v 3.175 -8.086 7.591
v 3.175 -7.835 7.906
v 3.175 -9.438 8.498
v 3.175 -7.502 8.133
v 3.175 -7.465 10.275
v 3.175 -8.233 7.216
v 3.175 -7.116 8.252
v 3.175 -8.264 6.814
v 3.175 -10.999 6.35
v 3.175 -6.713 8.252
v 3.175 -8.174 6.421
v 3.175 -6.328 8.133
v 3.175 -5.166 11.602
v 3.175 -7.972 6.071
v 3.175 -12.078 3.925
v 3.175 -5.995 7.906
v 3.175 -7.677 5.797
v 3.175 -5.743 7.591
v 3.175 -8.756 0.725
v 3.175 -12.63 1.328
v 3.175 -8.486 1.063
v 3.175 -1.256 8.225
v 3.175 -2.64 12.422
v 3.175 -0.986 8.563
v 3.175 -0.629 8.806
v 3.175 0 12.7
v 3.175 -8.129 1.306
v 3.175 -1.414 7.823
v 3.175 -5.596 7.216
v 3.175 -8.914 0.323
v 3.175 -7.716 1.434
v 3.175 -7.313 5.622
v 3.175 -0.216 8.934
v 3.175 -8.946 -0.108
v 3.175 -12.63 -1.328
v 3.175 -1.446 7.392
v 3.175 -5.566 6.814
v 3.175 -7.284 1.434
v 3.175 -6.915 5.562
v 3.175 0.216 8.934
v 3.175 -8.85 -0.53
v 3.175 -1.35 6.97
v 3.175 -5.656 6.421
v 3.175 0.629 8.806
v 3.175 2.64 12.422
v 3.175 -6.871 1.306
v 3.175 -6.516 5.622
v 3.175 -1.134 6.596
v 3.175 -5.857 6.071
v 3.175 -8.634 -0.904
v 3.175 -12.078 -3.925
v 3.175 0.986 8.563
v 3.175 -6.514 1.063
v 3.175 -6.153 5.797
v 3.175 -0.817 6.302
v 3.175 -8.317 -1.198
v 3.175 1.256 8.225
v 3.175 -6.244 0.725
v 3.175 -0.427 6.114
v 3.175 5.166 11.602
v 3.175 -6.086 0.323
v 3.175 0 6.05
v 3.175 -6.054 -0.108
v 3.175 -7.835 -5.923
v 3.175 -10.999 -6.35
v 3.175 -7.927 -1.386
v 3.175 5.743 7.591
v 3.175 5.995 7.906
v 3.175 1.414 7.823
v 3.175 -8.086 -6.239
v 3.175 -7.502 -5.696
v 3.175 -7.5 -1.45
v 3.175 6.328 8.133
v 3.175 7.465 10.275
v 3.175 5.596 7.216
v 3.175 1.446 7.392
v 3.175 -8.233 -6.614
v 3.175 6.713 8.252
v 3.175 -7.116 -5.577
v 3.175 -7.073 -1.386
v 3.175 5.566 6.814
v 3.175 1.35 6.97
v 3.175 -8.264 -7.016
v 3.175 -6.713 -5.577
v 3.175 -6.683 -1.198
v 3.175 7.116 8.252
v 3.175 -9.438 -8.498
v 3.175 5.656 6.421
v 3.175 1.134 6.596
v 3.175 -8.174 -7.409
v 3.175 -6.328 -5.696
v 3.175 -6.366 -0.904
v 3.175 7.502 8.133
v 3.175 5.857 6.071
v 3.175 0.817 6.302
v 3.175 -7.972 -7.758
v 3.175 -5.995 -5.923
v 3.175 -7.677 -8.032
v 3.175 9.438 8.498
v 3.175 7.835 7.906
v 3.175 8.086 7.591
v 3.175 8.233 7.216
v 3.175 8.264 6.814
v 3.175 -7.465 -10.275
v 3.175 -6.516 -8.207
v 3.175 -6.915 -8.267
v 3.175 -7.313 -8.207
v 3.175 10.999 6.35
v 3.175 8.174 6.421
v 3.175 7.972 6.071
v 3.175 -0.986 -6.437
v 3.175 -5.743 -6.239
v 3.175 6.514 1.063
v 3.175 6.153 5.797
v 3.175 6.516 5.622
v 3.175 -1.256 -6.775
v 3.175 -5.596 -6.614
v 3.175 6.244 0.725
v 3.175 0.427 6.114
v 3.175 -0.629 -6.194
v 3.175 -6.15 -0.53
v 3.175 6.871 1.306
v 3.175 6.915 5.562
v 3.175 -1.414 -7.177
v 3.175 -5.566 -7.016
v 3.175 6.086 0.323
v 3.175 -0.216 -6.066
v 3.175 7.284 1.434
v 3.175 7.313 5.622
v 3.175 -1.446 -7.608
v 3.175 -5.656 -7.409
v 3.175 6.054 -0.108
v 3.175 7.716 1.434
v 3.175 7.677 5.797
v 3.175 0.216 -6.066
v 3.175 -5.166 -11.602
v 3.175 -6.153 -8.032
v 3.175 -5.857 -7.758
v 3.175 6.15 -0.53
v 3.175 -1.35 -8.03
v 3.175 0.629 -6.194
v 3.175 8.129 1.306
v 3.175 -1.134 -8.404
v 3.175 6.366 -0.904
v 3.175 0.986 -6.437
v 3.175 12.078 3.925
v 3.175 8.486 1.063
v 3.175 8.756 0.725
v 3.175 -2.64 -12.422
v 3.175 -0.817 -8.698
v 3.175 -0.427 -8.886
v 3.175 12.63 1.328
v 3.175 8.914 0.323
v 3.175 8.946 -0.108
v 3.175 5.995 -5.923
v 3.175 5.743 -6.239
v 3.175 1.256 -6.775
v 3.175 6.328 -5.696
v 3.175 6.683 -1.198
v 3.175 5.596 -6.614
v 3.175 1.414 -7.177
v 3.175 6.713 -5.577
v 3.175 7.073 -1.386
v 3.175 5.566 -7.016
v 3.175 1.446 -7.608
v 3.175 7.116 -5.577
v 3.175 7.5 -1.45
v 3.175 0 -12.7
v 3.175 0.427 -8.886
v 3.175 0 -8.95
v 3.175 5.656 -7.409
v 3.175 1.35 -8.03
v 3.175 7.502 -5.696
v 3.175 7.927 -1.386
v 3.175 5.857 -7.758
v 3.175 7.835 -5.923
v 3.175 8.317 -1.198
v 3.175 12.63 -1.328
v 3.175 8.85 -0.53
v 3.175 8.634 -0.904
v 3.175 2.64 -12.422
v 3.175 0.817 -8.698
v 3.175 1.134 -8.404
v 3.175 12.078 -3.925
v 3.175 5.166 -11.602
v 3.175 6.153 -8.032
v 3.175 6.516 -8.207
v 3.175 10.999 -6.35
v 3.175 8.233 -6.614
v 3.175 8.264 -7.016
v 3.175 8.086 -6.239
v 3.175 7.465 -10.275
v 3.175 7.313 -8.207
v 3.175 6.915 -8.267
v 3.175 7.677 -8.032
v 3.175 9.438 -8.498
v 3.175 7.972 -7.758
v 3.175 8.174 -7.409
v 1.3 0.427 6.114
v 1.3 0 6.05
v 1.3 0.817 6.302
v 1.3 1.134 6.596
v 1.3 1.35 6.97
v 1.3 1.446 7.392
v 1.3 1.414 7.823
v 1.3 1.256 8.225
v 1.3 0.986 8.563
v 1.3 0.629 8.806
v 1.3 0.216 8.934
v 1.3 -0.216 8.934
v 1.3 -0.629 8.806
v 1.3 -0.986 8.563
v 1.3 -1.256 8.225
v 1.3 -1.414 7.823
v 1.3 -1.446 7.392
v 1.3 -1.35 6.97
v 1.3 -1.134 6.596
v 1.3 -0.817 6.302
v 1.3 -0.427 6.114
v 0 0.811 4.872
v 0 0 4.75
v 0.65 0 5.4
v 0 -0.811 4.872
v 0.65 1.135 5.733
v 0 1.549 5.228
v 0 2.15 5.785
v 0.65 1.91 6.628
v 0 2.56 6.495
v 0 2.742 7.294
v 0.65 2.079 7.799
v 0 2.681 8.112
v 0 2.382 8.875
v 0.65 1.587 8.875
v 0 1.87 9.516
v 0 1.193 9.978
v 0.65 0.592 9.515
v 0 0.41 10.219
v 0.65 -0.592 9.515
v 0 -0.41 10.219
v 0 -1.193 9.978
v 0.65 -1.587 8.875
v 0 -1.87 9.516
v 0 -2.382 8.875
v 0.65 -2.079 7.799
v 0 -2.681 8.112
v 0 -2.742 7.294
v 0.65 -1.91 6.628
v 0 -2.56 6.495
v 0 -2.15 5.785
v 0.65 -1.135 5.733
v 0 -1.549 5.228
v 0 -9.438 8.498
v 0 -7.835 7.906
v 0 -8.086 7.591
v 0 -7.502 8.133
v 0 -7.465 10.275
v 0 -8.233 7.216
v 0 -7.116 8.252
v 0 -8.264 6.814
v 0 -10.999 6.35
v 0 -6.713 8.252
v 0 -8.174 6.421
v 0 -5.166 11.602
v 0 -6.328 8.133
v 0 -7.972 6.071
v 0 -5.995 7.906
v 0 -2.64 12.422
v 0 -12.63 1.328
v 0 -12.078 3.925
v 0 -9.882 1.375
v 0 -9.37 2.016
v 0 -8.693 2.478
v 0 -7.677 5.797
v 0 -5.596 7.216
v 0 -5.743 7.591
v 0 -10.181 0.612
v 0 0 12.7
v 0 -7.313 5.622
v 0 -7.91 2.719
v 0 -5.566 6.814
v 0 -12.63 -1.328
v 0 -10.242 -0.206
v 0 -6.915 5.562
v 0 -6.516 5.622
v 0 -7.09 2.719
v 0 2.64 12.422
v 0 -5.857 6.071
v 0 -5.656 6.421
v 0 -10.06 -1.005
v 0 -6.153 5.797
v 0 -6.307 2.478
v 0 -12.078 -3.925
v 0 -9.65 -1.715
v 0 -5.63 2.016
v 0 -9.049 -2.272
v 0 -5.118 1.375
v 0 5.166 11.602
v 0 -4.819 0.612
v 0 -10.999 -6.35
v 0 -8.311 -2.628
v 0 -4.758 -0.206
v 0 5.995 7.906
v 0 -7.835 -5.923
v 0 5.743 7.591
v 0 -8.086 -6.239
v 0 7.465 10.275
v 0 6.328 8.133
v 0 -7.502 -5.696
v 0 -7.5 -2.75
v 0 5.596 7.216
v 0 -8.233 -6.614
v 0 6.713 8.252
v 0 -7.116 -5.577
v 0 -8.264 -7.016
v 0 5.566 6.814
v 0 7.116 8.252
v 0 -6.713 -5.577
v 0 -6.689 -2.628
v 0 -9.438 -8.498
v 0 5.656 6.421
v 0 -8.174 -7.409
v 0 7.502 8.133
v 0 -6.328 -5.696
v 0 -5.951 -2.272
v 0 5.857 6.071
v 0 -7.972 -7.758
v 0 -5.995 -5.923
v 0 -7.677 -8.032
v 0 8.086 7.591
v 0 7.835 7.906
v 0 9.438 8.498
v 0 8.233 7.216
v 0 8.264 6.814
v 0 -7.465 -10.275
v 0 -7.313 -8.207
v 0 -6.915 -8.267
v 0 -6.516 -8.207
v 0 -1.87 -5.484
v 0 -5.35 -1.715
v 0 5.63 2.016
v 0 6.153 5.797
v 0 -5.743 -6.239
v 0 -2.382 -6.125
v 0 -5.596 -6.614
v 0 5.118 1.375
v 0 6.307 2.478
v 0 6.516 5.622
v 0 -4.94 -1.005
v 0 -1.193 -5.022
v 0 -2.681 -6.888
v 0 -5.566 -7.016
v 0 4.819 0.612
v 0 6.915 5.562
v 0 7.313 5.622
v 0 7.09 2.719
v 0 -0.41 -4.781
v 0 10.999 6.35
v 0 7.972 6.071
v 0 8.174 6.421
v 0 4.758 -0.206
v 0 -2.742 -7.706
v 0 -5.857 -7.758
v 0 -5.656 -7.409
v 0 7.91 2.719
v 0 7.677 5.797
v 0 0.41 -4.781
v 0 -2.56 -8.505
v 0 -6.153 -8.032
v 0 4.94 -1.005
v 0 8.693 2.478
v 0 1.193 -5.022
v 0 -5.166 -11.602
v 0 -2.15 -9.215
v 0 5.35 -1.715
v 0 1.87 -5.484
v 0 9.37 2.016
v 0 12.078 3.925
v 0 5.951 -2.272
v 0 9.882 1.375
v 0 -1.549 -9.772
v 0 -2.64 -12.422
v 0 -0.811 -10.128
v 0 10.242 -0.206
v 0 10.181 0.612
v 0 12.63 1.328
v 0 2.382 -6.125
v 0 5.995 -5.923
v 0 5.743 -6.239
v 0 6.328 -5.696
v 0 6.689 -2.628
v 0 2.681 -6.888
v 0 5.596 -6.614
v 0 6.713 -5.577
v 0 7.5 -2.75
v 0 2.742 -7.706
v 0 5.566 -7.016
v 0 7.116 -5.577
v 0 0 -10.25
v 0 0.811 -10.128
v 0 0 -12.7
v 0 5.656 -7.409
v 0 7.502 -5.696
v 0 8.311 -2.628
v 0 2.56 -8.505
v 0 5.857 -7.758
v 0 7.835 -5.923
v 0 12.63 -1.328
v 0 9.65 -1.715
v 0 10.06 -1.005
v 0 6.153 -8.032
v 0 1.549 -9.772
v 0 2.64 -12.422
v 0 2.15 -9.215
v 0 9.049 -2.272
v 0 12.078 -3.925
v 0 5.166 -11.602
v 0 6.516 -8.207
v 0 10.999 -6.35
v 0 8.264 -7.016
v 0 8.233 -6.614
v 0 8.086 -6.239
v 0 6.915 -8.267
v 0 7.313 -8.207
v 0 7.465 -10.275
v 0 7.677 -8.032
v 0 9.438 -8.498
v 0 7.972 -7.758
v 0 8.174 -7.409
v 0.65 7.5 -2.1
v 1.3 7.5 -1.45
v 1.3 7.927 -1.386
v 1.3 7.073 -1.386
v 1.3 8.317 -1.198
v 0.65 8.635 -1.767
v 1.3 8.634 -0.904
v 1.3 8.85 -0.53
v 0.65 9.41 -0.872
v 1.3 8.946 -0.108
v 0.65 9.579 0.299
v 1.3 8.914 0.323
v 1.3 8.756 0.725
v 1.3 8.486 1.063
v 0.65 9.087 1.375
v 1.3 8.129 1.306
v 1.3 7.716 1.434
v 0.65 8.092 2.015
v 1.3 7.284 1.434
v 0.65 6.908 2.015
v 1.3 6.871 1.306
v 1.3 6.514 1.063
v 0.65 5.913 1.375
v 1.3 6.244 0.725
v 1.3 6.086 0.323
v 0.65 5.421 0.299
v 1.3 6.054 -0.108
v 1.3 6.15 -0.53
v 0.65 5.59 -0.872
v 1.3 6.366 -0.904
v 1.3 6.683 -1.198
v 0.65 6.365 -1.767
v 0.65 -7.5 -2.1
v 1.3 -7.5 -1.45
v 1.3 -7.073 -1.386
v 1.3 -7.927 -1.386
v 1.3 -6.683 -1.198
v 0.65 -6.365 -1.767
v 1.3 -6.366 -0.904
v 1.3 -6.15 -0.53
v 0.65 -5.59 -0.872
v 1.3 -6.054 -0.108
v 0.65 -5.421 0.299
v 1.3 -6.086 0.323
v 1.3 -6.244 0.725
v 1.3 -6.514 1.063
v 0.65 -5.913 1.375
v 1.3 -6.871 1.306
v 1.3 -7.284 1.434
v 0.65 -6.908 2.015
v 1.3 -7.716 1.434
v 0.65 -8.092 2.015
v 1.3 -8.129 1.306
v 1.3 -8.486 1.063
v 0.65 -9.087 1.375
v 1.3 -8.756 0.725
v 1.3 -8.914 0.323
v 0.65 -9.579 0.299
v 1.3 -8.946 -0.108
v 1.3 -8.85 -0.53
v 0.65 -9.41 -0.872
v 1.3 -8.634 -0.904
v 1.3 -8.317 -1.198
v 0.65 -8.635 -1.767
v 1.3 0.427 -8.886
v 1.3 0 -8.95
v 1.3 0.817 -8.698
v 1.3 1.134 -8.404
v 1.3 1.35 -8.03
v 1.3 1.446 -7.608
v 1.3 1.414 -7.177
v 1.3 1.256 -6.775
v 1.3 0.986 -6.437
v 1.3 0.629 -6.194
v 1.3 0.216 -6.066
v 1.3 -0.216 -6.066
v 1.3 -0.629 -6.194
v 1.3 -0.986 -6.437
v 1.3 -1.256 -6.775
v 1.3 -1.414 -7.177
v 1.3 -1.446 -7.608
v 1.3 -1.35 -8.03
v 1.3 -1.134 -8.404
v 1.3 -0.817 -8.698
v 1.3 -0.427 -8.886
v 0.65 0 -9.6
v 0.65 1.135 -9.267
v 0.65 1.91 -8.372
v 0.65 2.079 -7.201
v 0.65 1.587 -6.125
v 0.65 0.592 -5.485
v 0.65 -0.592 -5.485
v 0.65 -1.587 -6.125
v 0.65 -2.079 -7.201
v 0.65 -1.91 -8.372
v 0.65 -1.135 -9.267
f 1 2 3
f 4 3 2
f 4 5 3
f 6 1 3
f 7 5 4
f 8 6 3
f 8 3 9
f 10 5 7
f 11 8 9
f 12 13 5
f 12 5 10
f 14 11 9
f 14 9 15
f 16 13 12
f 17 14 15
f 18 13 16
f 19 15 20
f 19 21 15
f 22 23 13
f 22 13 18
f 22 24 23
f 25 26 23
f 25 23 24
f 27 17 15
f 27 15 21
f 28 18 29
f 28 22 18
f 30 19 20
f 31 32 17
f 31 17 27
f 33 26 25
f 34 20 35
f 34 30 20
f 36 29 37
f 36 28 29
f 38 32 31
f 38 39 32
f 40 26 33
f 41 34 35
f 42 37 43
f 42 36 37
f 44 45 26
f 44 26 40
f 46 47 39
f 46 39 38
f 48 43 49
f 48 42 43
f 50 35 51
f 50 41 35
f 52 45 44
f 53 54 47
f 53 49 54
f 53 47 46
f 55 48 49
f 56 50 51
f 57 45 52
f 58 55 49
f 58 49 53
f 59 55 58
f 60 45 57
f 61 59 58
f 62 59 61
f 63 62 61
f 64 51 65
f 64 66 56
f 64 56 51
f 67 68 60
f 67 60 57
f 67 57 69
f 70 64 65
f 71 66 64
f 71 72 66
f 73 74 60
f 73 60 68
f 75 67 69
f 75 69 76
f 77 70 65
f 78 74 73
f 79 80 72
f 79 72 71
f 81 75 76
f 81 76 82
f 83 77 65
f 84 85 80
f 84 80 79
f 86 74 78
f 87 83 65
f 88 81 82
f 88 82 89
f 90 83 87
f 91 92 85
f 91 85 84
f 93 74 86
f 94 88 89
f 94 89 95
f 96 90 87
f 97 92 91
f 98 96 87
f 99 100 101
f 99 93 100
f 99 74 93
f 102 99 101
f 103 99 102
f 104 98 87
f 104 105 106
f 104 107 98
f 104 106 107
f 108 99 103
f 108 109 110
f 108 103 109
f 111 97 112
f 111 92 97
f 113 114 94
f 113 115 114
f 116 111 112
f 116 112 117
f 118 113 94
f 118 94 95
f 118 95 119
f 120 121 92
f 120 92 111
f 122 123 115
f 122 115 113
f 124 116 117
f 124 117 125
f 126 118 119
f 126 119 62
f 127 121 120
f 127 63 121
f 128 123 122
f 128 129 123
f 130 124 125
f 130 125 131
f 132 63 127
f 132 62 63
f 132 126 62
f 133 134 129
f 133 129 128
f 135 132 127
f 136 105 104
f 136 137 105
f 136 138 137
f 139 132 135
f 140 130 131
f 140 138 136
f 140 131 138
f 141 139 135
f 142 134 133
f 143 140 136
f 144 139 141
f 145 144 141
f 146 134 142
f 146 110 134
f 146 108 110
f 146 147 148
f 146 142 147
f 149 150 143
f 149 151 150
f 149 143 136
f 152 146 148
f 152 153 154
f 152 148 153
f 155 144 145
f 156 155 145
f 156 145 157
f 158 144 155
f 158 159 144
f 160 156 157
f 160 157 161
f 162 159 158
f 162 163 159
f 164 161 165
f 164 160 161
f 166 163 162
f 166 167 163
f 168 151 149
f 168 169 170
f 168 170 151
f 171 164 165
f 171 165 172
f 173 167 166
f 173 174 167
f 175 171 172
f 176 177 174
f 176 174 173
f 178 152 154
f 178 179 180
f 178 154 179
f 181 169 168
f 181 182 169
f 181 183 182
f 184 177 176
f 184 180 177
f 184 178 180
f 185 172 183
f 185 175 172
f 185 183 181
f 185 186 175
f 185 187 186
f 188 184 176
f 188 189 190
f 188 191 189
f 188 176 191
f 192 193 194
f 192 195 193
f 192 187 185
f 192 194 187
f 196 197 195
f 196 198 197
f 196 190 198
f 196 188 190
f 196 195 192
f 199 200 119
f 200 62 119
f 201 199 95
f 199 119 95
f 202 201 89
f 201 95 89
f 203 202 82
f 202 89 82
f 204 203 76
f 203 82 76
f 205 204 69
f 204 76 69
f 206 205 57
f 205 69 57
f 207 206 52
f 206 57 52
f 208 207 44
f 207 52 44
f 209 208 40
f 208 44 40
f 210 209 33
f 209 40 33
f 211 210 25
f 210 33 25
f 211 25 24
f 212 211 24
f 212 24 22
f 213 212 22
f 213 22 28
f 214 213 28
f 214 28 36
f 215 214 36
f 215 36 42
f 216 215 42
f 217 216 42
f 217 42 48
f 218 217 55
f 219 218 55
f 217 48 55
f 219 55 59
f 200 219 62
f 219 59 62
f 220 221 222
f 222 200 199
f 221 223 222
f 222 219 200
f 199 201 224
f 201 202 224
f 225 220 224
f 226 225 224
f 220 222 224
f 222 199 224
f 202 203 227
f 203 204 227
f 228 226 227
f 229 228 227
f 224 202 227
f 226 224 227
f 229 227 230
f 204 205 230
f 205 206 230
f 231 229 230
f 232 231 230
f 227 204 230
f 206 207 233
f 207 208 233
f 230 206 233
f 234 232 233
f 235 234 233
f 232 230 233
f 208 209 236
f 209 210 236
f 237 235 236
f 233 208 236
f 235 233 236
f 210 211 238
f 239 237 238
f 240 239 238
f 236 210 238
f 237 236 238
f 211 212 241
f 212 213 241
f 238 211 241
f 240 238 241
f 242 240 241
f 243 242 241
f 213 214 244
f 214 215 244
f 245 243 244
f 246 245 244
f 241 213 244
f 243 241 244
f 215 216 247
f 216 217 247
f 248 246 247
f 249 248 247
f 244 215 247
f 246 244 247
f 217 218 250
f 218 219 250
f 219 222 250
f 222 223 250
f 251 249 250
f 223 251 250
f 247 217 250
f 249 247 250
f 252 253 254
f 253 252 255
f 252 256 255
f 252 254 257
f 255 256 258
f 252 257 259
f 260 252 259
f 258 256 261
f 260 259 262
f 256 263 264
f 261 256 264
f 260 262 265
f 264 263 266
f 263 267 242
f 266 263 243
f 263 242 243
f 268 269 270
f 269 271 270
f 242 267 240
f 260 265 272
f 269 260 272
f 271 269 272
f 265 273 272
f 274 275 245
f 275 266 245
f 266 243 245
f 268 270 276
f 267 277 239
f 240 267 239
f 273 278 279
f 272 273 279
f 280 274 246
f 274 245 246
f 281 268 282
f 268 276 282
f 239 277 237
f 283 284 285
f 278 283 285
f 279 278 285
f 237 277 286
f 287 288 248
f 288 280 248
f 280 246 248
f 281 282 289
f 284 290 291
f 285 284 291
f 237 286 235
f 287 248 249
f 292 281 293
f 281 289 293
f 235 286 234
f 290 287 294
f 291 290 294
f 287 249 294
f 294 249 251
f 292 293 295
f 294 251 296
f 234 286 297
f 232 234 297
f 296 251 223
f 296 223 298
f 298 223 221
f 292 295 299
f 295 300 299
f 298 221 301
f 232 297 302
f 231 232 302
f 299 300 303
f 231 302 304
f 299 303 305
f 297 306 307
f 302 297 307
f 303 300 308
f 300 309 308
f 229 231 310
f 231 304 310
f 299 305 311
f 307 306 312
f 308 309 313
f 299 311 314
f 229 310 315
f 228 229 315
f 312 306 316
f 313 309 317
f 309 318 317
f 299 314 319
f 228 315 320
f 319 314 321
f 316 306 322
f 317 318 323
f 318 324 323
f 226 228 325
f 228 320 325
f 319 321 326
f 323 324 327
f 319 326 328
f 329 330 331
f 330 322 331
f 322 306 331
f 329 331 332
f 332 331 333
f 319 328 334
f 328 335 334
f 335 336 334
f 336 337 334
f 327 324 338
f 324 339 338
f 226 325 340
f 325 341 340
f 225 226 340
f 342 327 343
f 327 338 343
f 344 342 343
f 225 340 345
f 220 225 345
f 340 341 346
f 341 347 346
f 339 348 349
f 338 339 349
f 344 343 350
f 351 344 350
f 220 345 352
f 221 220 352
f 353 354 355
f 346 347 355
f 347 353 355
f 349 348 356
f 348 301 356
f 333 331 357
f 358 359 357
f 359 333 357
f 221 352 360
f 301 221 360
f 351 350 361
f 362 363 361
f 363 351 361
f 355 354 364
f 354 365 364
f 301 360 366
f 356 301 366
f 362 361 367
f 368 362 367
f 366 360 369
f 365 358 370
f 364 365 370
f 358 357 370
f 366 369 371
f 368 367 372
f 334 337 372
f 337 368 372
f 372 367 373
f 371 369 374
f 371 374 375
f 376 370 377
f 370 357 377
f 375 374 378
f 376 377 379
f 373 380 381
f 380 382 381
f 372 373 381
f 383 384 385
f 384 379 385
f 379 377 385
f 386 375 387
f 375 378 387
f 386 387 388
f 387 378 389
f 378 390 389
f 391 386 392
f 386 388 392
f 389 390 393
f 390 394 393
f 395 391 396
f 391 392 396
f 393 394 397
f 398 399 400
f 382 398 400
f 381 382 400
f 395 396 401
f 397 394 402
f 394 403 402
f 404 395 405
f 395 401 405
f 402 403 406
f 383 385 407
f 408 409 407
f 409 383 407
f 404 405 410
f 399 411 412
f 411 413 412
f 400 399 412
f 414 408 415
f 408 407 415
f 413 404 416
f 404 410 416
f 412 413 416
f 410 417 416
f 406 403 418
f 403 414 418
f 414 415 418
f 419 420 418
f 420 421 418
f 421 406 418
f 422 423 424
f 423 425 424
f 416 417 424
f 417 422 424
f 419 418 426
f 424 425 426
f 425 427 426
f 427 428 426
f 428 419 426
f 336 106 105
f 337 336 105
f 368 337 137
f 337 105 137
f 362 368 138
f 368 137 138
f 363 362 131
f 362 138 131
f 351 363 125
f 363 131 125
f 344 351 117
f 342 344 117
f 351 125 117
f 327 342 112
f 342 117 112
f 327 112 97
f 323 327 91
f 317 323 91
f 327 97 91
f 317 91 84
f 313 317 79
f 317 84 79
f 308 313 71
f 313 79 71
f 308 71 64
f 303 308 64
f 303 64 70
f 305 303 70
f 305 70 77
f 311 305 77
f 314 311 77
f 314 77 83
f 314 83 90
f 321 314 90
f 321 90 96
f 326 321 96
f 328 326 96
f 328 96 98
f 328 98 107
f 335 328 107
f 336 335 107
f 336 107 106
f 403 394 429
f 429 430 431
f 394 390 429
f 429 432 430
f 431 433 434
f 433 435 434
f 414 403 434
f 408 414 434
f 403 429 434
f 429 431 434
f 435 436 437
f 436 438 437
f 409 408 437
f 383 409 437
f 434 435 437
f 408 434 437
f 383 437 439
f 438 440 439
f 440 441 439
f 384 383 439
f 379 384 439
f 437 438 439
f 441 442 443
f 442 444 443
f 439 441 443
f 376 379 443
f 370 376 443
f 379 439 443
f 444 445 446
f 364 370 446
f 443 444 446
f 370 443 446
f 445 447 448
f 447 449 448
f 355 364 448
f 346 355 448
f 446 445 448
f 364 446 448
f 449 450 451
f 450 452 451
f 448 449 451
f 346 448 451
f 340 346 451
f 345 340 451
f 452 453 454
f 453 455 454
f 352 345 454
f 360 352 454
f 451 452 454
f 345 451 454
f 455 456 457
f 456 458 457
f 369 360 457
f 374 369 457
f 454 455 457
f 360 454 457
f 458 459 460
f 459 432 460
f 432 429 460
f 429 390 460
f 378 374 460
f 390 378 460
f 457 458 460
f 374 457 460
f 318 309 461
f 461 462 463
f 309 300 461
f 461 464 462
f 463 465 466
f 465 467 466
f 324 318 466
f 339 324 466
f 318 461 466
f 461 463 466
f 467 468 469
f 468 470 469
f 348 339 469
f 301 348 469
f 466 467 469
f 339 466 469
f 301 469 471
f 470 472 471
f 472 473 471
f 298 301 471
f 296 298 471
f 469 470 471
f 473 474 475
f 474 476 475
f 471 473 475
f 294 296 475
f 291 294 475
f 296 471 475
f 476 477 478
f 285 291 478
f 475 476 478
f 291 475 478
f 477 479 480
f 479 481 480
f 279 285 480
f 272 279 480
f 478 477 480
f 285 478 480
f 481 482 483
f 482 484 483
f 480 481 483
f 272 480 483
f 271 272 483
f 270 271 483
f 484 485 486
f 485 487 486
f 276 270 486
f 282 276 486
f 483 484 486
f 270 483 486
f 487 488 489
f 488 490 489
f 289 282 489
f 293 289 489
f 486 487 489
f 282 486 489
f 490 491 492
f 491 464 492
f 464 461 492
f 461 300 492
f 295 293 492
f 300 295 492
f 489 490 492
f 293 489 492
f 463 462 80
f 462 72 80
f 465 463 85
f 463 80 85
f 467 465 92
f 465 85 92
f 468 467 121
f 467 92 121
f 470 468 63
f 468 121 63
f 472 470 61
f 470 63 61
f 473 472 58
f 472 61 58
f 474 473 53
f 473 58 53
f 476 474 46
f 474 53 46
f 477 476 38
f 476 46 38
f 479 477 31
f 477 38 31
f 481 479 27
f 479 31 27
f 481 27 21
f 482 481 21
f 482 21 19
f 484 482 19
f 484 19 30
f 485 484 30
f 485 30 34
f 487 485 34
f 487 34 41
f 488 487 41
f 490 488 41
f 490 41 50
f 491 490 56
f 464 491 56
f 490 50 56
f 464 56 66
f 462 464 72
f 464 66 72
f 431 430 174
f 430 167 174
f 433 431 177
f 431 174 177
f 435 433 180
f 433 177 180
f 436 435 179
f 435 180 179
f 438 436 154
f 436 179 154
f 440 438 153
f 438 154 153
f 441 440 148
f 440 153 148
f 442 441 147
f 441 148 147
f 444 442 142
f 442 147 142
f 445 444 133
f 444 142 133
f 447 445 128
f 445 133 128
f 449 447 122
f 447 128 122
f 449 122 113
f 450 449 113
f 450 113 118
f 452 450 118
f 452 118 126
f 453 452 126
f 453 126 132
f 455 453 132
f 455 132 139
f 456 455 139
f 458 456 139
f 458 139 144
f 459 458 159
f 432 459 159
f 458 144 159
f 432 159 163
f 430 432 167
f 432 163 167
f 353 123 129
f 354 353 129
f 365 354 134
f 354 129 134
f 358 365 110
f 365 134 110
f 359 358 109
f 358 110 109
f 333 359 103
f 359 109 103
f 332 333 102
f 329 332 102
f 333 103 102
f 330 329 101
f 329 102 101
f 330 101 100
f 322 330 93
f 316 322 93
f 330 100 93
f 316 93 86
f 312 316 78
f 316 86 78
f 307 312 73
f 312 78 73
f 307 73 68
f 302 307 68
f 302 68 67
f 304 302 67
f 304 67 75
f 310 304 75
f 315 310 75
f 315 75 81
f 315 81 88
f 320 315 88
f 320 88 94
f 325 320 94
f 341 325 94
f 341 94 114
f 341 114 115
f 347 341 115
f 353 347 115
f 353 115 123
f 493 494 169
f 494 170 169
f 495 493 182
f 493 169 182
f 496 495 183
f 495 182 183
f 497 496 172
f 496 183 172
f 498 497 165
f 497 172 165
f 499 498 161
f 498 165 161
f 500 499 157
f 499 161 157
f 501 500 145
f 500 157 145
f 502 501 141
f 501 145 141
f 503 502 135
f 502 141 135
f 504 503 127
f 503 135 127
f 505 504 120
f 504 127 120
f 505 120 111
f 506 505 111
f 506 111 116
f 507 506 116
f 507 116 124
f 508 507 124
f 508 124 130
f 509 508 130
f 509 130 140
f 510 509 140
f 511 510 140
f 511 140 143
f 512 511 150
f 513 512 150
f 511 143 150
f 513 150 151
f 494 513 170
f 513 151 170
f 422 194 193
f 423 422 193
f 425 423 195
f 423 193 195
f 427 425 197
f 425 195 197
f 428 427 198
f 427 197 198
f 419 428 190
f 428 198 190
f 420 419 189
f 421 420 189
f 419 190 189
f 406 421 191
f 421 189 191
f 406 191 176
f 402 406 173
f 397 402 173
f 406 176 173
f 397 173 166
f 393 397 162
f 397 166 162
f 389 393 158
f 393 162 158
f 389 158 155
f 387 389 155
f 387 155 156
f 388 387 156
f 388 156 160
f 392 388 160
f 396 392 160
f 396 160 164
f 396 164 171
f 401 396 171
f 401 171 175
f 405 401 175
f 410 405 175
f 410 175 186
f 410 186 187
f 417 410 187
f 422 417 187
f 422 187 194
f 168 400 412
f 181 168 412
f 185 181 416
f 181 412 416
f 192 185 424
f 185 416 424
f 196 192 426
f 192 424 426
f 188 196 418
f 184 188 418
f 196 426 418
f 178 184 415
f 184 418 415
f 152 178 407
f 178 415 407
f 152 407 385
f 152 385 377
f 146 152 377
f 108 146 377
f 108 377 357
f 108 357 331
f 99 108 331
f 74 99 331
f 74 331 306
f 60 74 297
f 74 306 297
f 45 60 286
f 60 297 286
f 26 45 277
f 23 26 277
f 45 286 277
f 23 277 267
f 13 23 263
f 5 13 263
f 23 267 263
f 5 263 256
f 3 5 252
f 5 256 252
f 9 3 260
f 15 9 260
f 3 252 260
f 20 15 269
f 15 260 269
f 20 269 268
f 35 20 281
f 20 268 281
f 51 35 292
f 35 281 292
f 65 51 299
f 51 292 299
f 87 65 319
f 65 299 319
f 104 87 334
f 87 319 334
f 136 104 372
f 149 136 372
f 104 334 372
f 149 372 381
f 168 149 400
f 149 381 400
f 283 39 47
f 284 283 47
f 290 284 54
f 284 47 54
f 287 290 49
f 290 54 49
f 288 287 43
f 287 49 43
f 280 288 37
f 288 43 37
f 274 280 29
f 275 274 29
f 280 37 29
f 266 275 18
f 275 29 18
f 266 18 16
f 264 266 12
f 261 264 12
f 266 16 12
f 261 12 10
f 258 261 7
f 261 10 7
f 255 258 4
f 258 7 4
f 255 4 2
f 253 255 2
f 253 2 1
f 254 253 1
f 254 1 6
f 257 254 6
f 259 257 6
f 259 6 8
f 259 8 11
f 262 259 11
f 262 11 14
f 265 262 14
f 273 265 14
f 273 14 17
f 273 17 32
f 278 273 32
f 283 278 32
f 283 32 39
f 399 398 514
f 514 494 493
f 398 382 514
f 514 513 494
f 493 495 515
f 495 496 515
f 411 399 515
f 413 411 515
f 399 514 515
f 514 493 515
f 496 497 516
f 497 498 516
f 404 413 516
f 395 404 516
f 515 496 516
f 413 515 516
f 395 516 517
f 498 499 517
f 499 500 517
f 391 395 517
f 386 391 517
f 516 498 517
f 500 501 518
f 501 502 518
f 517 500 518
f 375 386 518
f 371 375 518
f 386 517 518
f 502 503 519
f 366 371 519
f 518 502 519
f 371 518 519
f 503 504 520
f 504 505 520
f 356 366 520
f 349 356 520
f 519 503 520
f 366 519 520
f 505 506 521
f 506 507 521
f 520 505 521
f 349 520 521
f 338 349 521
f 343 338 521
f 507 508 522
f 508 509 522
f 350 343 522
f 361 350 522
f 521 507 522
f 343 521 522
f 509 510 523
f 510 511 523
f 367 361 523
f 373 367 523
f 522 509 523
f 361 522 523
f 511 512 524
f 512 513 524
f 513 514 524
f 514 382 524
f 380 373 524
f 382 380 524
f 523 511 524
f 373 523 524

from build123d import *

# Parameters (mm, degrees)
SKETCH1_R                                         = 12.7
BOSS_EXTRUDE1_DEPTH                               = 3.175
CSK_FOR_M2_5_FLAT_HEAD_MACHINE_SCREW1_D           = 2.9
CSK_FOR_M2_5_FLAT_HEAD_MACHINE_SCREW1_CSINK_D     = 5.5
CSK_FOR_M2_5_FLAT_HEAD_MACHINE_SCREW1_CSINK_ANGLE = 90
F_6_32_TAPPED_HOLE1_D                             = 2.7051


with BuildPart() as part:
    # Sketch1 → Boss-Extrude1 (new body)
    with BuildSketch(Plane(origin=(0, 0, 0), x_dir=(0, 0, -1), z_dir=(1, 0, 0))):
        Circle(SKETCH1_R)
    extrude(amount=BOSS_EXTRUDE1_DEPTH)

    # CSK for M2.5 Flat Head Machine Screw1 (through all)
    with Locations(Plane.ZY):
        with Locations((0, 7.5), (0, -7.5), (7.5, 0), (-7.5, 0)):
            CounterSinkHole(CSK_FOR_M2_5_FLAT_HEAD_MACHINE_SCREW1_D / 2, CSK_FOR_M2_5_FLAT_HEAD_MACHINE_SCREW1_CSINK_D / 2, counter_sink_angle=CSK_FOR_M2_5_FLAT_HEAD_MACHINE_SCREW1_CSINK_ANGLE)

    # #6-32 Tapped Hole1 (through all)
    with Locations(Plane.ZY):
        with Locations((-6.914797213, 6.914797213), (-6.914797213, -6.914797213), (6.914797213, 6.914797213), (6.914797213, -6.914797213)):
            Hole(F_6_32_TAPPED_HOLE1_D / 2)


solid = part.part
